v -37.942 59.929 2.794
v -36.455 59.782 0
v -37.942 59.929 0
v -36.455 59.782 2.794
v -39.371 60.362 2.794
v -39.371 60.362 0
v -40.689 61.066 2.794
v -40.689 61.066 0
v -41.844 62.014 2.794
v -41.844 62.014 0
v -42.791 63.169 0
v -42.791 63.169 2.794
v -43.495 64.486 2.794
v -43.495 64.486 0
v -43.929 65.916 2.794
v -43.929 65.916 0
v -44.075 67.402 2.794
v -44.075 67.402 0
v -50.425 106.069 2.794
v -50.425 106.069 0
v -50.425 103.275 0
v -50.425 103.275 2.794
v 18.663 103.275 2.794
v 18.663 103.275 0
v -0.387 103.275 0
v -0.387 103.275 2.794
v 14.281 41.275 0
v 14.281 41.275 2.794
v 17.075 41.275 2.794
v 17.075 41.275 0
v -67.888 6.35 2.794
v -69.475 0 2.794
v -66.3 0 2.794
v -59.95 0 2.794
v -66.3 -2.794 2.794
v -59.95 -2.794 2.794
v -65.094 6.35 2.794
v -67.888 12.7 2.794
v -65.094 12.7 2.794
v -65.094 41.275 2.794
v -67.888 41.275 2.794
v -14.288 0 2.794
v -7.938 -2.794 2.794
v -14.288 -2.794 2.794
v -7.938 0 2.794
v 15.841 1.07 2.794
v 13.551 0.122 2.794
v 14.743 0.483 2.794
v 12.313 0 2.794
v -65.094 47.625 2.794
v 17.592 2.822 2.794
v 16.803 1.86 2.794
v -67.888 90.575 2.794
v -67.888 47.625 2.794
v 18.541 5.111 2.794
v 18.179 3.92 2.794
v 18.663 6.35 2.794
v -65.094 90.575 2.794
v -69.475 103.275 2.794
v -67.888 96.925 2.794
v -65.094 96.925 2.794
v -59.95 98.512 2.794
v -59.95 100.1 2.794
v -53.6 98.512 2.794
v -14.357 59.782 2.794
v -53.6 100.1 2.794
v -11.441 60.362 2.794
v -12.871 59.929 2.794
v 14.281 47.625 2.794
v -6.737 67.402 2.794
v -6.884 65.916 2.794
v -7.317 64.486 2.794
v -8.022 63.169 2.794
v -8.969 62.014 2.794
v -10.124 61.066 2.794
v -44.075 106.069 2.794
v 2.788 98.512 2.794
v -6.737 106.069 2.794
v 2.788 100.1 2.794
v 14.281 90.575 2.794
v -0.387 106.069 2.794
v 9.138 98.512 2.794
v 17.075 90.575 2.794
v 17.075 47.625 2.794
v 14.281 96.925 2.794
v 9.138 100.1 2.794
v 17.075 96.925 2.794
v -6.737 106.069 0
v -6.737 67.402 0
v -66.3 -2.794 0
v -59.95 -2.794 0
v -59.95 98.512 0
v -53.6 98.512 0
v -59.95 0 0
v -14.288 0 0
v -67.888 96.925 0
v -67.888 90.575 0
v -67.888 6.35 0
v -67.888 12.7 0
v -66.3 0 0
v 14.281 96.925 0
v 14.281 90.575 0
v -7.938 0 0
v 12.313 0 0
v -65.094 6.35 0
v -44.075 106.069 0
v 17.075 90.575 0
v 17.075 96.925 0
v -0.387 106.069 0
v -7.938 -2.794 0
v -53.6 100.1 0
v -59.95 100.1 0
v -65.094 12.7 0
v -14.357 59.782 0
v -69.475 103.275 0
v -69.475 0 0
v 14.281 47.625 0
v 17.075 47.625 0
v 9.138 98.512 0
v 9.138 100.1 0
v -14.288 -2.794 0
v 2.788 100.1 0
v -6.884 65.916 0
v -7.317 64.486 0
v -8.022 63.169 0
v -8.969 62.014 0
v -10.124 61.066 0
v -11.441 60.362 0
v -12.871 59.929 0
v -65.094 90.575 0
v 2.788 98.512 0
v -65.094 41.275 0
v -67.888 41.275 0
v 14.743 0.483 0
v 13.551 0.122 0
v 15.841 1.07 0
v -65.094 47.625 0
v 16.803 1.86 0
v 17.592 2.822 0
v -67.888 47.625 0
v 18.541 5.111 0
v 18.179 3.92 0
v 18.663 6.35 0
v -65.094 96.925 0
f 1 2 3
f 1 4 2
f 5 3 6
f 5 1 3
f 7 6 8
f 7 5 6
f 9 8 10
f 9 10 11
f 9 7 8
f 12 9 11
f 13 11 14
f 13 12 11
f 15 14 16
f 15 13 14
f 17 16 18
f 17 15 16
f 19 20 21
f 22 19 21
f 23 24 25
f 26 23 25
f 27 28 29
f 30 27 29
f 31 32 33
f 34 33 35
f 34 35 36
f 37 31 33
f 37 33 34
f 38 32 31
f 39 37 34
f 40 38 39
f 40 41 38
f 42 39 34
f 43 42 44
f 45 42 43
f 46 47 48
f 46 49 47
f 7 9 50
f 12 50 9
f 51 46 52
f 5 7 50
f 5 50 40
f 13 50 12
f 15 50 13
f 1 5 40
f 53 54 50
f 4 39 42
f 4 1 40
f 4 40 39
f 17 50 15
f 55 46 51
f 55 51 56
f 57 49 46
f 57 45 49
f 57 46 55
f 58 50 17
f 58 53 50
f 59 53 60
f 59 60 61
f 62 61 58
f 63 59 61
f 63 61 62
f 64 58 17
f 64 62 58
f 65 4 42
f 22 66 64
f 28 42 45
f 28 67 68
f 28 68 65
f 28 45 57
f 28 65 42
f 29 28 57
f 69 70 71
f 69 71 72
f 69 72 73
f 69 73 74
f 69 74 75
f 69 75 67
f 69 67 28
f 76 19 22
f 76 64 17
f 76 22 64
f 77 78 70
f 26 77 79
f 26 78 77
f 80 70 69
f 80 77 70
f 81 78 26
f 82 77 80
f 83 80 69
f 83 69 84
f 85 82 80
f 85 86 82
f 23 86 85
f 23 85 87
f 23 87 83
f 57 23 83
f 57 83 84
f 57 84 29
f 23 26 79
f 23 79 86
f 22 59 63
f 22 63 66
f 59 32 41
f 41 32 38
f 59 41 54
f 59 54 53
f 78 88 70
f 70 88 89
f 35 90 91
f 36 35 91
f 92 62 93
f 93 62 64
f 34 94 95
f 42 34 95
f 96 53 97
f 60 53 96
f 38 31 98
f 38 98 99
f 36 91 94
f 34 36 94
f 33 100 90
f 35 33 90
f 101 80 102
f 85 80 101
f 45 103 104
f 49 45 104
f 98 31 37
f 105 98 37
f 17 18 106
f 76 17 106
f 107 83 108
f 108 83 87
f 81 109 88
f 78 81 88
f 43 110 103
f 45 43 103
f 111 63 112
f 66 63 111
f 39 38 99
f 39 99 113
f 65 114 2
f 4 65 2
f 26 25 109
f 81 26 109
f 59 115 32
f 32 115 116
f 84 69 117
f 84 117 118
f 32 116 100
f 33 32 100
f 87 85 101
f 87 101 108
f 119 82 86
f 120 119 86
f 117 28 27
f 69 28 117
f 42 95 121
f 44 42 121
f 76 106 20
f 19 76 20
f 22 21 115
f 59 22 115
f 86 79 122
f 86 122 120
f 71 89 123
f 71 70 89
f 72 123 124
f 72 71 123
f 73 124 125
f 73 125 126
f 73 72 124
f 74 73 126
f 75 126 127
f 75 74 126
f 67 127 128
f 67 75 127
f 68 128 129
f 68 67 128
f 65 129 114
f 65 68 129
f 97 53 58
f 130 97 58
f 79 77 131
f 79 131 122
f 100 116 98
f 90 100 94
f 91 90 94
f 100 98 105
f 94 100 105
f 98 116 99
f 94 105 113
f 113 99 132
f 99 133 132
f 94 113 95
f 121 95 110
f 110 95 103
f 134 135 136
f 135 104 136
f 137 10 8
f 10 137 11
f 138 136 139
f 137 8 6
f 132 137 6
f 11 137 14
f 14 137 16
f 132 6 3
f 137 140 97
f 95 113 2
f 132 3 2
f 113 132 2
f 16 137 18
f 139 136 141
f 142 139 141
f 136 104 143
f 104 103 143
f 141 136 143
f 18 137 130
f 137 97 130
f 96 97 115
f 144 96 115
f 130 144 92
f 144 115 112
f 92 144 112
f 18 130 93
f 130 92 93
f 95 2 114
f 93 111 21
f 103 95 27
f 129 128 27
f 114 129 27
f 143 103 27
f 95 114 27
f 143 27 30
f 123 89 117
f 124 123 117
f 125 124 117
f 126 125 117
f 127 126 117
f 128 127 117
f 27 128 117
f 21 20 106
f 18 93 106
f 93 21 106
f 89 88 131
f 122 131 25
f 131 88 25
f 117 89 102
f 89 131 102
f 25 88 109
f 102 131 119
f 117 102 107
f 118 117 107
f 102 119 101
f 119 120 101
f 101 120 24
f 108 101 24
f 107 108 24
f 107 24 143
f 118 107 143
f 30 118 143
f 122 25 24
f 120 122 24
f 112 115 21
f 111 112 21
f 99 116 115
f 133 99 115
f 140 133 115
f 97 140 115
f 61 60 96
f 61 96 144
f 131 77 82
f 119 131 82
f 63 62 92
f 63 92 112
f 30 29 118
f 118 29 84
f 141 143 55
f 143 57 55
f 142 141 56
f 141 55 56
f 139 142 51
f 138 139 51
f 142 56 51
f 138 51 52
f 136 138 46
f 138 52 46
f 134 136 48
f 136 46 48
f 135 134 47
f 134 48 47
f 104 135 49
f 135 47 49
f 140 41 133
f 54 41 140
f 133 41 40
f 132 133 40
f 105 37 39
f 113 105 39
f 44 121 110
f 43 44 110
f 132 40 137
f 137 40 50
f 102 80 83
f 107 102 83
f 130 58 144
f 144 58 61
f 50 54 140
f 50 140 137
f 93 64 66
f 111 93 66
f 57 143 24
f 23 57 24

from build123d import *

# Parameters (mm, degrees)
BOSS_EXTRUDE1_DEPTH = 2.794
FILLET1_R           = 7.62
SKETCH2_W           = 6.35
SKETCH2_H           = 1.5875
SKETCH2_W_2         = 2.794
SKETCH2_H_2         = 6.35
CUT_EXTRUDE1_DEPTH  = 127.827697441
FILLET2_R           = 6.35


with BuildPart() as part:
    # Sketch1 → Boss-Extrude1 (new body)
    with BuildSketch(Plane.XY):
        Polygon((18.662640042, 103.275), (-0.387359958, 103.275), (-0.387359958, 106.069), (-6.737359958, 106.069), (-6.737359958, 59.782284891), (-44.075359958, 59.782284891), (-44.075359958, 106.069), (-50.425359958, 106.069), (-50.425359958, 103.275), (-69.475359958, 103.275), (-69.475359958, 0), (-66.300359958, 0), (-66.300359958, -2.794), (-59.950359958, -2.794), (-59.950359958, 0), (-14.2875, 0), (-14.2875, -2.794), (-7.9375, -2.794), (-7.9375, 0), (18.662640042, 0), align=None)
    extrude(amount=BOSS_EXTRUDE1_DEPTH)

    # Fillet1
    fillet1_edges = [part.edges().sort_by_distance(p)[0] for p in [
        (-44.075359958, 59.782284891, 1.397),
        (-6.737359958, 59.782284891, 1.397),
    ]]
    fillet(fillet1_edges, radius=FILLET1_R)

    # Sketch2 → Cut-Extrude1 (cut, through all)
    with BuildSketch(Plane.XY.offset(2.794)):
        with Locations((-56.775359958, 99.30625)):
            Rectangle(SKETCH2_W, SKETCH2_H)
        with Locations((5.962640042, 99.30625)):
            Rectangle(SKETCH2_W, SKETCH2_H)
        with Locations((15.678140042, 44.45)):
            Rectangle(SKETCH2_W_2, SKETCH2_H_2)
        with Locations((15.678140042, 93.75)):
            Rectangle(SKETCH2_W_2, SKETCH2_H_2)
        with Locations((-66.490859958, 93.75)):
            Rectangle(SKETCH2_W_2, SKETCH2_H_2)
        with Locations((-66.490859958, 44.45)):
            Rectangle(SKETCH2_W_2, SKETCH2_H_2)
        with Locations((-66.490859958, 9.525)):
            Rectangle(SKETCH2_W_2, SKETCH2_H_2)
    extrude(amount=-CUT_EXTRUDE1_DEPTH, mode=Mode.SUBTRACT)

    # Fillet2
    fillet2_edges = [part.edges().sort_by_distance(p)[0] for p in [
        (18.662640042, 0, 1.397),
    ]]
    fillet(fillet2_edges, radius=FILLET2_R)


solid = part.part
